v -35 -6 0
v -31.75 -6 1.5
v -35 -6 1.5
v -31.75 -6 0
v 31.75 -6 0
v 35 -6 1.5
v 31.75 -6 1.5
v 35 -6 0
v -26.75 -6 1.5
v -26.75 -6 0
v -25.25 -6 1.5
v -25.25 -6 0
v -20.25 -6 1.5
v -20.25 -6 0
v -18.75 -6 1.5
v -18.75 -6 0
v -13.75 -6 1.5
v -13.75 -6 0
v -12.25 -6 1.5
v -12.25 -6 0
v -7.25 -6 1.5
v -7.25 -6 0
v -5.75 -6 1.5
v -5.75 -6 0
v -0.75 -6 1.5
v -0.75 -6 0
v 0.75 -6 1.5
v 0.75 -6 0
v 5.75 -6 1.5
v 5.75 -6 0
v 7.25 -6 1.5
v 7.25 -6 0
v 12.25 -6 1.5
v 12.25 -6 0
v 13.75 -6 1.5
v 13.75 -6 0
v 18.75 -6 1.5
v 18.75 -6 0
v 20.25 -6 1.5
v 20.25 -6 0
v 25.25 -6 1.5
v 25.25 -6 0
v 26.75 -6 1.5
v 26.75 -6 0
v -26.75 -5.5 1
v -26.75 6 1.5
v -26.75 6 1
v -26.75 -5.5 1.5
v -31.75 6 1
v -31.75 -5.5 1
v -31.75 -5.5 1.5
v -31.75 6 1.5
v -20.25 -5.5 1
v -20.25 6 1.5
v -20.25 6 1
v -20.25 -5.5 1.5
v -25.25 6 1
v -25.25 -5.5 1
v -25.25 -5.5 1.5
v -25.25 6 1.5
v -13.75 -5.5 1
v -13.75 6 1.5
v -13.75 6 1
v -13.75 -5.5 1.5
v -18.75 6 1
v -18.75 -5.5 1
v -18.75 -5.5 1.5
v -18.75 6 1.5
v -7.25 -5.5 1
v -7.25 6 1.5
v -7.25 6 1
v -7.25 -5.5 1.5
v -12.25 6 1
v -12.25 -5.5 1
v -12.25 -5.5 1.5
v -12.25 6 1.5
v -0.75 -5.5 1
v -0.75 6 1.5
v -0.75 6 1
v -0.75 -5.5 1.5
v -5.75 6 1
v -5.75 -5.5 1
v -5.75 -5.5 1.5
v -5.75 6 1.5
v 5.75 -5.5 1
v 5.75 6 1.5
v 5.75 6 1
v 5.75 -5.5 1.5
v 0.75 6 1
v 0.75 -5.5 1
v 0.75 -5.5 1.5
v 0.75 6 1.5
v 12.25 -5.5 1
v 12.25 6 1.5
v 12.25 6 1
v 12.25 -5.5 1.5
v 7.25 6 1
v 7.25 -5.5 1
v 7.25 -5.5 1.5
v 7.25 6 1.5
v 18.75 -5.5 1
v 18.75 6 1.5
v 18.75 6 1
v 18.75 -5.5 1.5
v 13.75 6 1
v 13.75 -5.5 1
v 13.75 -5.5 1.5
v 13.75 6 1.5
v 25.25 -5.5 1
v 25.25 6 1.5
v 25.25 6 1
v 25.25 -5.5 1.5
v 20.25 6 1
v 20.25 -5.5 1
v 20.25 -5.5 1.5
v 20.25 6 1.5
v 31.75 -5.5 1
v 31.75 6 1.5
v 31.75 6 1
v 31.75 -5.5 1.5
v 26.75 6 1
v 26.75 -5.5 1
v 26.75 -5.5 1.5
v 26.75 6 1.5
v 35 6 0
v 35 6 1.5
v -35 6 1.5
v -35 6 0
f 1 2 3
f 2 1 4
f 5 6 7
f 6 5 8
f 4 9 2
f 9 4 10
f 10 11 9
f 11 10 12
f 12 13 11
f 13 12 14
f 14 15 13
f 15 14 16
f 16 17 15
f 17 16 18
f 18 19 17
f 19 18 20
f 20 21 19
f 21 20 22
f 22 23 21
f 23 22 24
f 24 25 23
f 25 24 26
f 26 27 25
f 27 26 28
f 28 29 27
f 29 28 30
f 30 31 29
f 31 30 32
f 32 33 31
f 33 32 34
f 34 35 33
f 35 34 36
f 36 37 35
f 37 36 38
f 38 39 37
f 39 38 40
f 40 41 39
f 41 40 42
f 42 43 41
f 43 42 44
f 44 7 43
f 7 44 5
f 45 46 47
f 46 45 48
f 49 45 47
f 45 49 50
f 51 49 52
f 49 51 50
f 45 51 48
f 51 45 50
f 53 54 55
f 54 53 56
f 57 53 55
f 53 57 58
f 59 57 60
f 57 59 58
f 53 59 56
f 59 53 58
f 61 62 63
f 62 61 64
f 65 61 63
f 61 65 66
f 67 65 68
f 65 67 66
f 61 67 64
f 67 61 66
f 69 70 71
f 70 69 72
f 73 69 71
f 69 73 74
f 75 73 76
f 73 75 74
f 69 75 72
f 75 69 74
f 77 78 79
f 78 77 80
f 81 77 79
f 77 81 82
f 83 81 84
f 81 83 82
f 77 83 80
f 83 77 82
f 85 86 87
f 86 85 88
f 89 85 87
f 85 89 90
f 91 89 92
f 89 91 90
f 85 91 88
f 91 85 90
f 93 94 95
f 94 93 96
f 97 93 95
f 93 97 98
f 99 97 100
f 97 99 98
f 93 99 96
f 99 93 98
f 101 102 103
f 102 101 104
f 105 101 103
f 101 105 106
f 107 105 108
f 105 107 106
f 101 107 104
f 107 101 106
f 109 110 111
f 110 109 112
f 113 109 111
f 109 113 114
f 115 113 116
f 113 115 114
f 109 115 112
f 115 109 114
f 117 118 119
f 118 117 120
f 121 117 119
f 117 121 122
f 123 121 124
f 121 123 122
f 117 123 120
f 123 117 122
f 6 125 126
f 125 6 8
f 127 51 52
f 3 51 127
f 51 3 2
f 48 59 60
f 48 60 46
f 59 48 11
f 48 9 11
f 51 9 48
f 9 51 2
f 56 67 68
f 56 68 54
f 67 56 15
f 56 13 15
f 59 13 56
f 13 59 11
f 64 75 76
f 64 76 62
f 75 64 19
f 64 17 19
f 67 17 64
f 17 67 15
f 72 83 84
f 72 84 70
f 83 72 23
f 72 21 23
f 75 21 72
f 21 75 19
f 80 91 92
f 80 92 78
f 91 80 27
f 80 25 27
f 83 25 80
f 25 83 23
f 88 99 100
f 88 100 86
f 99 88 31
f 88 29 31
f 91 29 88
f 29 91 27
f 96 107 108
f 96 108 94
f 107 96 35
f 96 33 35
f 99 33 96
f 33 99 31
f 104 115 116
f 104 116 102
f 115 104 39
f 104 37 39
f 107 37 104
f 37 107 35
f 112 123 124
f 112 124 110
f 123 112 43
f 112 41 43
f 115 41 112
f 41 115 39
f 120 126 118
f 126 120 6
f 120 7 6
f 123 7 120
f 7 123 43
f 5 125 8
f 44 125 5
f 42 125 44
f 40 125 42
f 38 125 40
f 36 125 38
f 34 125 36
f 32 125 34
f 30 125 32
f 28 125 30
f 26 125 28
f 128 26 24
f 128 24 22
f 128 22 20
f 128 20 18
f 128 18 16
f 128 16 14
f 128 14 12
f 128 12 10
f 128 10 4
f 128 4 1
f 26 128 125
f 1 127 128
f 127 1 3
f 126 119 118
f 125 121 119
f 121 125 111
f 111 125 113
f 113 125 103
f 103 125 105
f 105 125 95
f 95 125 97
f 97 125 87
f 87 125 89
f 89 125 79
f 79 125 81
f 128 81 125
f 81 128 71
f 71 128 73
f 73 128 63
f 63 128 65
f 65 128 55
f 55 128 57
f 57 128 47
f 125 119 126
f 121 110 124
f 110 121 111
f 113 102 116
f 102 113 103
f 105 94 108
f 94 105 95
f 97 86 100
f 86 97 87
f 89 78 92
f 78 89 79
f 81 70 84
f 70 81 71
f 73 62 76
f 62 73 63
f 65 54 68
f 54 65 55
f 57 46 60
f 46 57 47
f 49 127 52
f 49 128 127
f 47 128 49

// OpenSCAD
// 10-well agarose gel comb - printed lying flat on the bed
// Units: mm

// ---------- Parameters ----------
plate_thickness = 1.5;    // Z thickness of the whole comb
spine_length    = 70;     // X length of the back spine
spine_width     = 12;     // Y width of the back spine
tooth_count     = 10;     // number of wells / teeth
tooth_width     = 5.0;    // tooth width along X
tooth_length    = 12;     // tooth length along Y
tooth_height    = 12;     // tooth height in Z (from top of spine)
gap             = 1.5;    // gap between neighbouring teeth (X)
overcut         = 0.5;    // extra length so cutters pass through faces

$fn = 64;

// ---------- Derived ----------
pitch      = tooth_width + gap;                 // centre-to-centre spacing
row_offset = -(tooth_count - 1) * pitch / 2;    // centres the row on the spine

// ---------- Model ----------
difference() {
    // Base plate (spine + tooth footprints)
    translate([-spine_length / 2, -spine_width / 2, 0])
        cube([spine_length, spine_width, plate_thickness]);

    // Teeth that hang from the -Y edge of the spine
    for (i = [0 : tooth_count - 1]) {
        translate([row_offset + i * pitch - tooth_width / 2,
                   -spine_width / 2 - tooth_height,
                   -overcut])
            cube([tooth_width, tooth_length, plate_thickness + tooth_height + 2 * overcut]);
    }

    // Wells: cut through the top of the spine (and into the teeth)
    for (i = [0 : tooth_count - 1]) {
        translate([row_offset + i * pitch - tooth_width / 2,
                   -spine_width / 2 + overcut,
                   plate_thickness - overcut])
            cube([tooth_width, tooth_length, plate_thickness + tooth_height]);
    }
}
